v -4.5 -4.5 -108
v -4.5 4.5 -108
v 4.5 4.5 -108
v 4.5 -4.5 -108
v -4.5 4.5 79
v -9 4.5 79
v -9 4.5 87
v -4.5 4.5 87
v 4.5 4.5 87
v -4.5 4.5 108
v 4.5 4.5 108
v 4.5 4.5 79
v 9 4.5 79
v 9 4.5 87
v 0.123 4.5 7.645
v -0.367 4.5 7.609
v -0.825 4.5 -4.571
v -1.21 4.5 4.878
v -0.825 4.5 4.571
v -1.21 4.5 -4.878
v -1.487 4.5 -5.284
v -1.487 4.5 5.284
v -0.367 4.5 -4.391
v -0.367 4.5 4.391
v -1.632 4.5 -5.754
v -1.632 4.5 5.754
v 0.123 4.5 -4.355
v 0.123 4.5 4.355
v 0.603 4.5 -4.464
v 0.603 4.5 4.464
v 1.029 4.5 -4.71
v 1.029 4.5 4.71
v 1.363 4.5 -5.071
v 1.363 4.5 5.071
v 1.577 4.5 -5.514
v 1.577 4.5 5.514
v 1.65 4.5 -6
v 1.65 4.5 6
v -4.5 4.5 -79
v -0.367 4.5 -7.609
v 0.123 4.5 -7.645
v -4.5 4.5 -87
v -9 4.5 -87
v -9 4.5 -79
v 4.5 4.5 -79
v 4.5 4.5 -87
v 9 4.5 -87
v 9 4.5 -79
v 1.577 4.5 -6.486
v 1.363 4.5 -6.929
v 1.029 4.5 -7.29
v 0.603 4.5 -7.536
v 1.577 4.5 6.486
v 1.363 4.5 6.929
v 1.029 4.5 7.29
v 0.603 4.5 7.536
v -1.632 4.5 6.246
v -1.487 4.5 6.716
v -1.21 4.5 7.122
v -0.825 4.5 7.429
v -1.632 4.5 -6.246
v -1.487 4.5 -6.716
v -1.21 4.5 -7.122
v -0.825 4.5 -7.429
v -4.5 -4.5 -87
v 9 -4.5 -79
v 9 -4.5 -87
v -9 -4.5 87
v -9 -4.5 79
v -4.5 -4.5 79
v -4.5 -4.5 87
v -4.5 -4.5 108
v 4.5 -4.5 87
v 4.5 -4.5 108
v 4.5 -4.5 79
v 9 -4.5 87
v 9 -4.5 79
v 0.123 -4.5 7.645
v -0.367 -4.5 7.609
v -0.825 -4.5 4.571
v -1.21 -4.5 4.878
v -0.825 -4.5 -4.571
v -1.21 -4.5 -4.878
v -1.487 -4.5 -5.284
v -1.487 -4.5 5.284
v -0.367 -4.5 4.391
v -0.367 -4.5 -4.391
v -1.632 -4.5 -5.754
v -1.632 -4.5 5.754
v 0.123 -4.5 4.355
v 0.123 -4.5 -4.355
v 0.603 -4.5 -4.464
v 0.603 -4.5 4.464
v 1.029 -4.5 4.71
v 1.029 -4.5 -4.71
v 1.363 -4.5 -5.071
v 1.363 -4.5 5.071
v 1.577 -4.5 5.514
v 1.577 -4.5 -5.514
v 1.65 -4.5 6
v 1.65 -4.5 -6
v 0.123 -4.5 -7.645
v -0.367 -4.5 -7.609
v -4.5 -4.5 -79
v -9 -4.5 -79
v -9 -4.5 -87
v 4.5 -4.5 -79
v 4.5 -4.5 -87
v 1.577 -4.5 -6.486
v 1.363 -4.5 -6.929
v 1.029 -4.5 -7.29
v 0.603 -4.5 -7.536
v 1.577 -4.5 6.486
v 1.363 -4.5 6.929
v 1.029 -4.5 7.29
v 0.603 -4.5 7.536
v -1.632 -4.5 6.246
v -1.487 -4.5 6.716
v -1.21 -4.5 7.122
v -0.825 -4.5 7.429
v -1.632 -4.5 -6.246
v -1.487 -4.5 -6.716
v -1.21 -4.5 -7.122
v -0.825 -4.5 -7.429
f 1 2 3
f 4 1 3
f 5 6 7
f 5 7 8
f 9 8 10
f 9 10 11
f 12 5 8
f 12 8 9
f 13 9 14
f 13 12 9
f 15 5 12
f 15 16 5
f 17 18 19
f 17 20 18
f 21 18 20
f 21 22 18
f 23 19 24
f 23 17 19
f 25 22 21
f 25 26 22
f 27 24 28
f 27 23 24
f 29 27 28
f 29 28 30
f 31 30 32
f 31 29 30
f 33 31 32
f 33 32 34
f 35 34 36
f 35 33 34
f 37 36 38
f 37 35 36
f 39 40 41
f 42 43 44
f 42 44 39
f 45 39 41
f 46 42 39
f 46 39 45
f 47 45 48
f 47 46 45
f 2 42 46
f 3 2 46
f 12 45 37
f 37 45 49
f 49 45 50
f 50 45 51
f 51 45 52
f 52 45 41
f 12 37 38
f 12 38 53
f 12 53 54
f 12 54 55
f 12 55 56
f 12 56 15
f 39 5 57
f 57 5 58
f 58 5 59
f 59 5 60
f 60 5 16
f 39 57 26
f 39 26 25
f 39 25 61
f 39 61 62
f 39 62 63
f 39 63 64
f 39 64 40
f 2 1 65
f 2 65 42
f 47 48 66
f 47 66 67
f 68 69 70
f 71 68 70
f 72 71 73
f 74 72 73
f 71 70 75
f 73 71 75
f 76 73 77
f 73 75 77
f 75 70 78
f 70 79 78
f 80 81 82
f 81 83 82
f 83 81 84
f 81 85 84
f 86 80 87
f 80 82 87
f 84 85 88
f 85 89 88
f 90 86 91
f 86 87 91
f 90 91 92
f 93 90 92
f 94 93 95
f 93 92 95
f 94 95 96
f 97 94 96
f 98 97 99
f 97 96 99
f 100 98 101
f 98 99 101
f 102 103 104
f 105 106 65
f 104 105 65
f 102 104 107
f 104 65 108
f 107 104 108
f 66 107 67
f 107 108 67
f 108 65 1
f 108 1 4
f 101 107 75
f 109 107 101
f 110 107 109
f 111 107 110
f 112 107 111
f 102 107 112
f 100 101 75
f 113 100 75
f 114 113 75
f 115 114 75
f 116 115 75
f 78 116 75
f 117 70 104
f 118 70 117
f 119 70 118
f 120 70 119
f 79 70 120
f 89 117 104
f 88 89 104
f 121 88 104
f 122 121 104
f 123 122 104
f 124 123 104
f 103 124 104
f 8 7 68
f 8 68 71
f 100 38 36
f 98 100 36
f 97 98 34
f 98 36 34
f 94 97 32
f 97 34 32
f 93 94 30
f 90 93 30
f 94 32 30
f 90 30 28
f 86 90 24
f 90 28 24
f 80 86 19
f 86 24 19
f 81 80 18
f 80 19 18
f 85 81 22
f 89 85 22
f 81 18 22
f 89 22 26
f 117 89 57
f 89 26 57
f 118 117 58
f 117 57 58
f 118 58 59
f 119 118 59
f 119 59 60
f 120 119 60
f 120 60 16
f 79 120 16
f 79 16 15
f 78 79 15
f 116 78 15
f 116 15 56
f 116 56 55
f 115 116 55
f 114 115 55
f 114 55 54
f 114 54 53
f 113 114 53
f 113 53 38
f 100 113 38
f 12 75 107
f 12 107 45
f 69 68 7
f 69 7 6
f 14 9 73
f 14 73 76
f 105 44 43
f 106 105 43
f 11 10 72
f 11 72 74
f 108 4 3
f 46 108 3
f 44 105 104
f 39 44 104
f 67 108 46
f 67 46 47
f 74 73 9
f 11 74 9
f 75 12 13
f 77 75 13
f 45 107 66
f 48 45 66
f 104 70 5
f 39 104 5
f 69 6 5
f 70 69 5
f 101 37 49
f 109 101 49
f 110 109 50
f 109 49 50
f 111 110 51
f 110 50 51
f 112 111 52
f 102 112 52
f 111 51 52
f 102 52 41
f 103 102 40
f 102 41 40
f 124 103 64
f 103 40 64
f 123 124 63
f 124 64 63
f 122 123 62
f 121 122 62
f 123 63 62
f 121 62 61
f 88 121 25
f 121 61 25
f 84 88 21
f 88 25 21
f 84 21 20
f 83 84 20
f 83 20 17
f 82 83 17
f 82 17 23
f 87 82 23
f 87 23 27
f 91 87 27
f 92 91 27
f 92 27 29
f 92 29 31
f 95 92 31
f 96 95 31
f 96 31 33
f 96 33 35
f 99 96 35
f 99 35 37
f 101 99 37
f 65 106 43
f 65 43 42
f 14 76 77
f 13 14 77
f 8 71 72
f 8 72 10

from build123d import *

# Parameters (mm, degrees)
SKETCH1_W               = 9
SKETCH1_H               = 9
BOSS_EXTRUDE1_DEPTH     = 108
SKETCH2_W               = 18
SKETCH2_H               = 8
BOSS_EXTRUDE2_DEPTH     = 4.5
SKETCH3_R               = 1.65
CUT_EXTRUDE1_DEPTH      = 1
CUT_EXTRUDE1_DEPTH_BACK = 10


with BuildPart() as part:
    # Sketch1 → Boss-Extrude1 (new body, symmetric)
    with BuildSketch(Plane.XY):
        Rectangle(SKETCH1_W, SKETCH1_H)
    extrude(amount=BOSS_EXTRUDE1_DEPTH, both=True)

    # Sketch2 → Boss-Extrude2 (add, symmetric)
    with BuildSketch(Plane(origin=(0, 0, 0), x_dir=(1, 0, 0), z_dir=(0, 1, 0))):
        with Locations((0, 83)):
            Rectangle(SKETCH2_W, SKETCH2_H)
        with Locations((0, -83)):
            Rectangle(SKETCH2_W, SKETCH2_H)
    extrude(amount=BOSS_EXTRUDE2_DEPTH, both=True)

    # Sketch3 → Cut-Extrude1 (cut, two sides)
    with BuildSketch(Plane(origin=(0, 4.5, 0), x_dir=(1, 0, 0), z_dir=(0, 1, 0))) as cut_extrude1_sk:
        with Locations((0, 6)):
            Circle(SKETCH3_R)
        with Locations((0, -6)):
            Circle(SKETCH3_R)
    extrude(amount=CUT_EXTRUDE1_DEPTH, mode=Mode.SUBTRACT)
    extrude(cut_extrude1_sk.sketch, amount=-CUT_EXTRUDE1_DEPTH_BACK, mode=Mode.SUBTRACT)


solid = part.part
